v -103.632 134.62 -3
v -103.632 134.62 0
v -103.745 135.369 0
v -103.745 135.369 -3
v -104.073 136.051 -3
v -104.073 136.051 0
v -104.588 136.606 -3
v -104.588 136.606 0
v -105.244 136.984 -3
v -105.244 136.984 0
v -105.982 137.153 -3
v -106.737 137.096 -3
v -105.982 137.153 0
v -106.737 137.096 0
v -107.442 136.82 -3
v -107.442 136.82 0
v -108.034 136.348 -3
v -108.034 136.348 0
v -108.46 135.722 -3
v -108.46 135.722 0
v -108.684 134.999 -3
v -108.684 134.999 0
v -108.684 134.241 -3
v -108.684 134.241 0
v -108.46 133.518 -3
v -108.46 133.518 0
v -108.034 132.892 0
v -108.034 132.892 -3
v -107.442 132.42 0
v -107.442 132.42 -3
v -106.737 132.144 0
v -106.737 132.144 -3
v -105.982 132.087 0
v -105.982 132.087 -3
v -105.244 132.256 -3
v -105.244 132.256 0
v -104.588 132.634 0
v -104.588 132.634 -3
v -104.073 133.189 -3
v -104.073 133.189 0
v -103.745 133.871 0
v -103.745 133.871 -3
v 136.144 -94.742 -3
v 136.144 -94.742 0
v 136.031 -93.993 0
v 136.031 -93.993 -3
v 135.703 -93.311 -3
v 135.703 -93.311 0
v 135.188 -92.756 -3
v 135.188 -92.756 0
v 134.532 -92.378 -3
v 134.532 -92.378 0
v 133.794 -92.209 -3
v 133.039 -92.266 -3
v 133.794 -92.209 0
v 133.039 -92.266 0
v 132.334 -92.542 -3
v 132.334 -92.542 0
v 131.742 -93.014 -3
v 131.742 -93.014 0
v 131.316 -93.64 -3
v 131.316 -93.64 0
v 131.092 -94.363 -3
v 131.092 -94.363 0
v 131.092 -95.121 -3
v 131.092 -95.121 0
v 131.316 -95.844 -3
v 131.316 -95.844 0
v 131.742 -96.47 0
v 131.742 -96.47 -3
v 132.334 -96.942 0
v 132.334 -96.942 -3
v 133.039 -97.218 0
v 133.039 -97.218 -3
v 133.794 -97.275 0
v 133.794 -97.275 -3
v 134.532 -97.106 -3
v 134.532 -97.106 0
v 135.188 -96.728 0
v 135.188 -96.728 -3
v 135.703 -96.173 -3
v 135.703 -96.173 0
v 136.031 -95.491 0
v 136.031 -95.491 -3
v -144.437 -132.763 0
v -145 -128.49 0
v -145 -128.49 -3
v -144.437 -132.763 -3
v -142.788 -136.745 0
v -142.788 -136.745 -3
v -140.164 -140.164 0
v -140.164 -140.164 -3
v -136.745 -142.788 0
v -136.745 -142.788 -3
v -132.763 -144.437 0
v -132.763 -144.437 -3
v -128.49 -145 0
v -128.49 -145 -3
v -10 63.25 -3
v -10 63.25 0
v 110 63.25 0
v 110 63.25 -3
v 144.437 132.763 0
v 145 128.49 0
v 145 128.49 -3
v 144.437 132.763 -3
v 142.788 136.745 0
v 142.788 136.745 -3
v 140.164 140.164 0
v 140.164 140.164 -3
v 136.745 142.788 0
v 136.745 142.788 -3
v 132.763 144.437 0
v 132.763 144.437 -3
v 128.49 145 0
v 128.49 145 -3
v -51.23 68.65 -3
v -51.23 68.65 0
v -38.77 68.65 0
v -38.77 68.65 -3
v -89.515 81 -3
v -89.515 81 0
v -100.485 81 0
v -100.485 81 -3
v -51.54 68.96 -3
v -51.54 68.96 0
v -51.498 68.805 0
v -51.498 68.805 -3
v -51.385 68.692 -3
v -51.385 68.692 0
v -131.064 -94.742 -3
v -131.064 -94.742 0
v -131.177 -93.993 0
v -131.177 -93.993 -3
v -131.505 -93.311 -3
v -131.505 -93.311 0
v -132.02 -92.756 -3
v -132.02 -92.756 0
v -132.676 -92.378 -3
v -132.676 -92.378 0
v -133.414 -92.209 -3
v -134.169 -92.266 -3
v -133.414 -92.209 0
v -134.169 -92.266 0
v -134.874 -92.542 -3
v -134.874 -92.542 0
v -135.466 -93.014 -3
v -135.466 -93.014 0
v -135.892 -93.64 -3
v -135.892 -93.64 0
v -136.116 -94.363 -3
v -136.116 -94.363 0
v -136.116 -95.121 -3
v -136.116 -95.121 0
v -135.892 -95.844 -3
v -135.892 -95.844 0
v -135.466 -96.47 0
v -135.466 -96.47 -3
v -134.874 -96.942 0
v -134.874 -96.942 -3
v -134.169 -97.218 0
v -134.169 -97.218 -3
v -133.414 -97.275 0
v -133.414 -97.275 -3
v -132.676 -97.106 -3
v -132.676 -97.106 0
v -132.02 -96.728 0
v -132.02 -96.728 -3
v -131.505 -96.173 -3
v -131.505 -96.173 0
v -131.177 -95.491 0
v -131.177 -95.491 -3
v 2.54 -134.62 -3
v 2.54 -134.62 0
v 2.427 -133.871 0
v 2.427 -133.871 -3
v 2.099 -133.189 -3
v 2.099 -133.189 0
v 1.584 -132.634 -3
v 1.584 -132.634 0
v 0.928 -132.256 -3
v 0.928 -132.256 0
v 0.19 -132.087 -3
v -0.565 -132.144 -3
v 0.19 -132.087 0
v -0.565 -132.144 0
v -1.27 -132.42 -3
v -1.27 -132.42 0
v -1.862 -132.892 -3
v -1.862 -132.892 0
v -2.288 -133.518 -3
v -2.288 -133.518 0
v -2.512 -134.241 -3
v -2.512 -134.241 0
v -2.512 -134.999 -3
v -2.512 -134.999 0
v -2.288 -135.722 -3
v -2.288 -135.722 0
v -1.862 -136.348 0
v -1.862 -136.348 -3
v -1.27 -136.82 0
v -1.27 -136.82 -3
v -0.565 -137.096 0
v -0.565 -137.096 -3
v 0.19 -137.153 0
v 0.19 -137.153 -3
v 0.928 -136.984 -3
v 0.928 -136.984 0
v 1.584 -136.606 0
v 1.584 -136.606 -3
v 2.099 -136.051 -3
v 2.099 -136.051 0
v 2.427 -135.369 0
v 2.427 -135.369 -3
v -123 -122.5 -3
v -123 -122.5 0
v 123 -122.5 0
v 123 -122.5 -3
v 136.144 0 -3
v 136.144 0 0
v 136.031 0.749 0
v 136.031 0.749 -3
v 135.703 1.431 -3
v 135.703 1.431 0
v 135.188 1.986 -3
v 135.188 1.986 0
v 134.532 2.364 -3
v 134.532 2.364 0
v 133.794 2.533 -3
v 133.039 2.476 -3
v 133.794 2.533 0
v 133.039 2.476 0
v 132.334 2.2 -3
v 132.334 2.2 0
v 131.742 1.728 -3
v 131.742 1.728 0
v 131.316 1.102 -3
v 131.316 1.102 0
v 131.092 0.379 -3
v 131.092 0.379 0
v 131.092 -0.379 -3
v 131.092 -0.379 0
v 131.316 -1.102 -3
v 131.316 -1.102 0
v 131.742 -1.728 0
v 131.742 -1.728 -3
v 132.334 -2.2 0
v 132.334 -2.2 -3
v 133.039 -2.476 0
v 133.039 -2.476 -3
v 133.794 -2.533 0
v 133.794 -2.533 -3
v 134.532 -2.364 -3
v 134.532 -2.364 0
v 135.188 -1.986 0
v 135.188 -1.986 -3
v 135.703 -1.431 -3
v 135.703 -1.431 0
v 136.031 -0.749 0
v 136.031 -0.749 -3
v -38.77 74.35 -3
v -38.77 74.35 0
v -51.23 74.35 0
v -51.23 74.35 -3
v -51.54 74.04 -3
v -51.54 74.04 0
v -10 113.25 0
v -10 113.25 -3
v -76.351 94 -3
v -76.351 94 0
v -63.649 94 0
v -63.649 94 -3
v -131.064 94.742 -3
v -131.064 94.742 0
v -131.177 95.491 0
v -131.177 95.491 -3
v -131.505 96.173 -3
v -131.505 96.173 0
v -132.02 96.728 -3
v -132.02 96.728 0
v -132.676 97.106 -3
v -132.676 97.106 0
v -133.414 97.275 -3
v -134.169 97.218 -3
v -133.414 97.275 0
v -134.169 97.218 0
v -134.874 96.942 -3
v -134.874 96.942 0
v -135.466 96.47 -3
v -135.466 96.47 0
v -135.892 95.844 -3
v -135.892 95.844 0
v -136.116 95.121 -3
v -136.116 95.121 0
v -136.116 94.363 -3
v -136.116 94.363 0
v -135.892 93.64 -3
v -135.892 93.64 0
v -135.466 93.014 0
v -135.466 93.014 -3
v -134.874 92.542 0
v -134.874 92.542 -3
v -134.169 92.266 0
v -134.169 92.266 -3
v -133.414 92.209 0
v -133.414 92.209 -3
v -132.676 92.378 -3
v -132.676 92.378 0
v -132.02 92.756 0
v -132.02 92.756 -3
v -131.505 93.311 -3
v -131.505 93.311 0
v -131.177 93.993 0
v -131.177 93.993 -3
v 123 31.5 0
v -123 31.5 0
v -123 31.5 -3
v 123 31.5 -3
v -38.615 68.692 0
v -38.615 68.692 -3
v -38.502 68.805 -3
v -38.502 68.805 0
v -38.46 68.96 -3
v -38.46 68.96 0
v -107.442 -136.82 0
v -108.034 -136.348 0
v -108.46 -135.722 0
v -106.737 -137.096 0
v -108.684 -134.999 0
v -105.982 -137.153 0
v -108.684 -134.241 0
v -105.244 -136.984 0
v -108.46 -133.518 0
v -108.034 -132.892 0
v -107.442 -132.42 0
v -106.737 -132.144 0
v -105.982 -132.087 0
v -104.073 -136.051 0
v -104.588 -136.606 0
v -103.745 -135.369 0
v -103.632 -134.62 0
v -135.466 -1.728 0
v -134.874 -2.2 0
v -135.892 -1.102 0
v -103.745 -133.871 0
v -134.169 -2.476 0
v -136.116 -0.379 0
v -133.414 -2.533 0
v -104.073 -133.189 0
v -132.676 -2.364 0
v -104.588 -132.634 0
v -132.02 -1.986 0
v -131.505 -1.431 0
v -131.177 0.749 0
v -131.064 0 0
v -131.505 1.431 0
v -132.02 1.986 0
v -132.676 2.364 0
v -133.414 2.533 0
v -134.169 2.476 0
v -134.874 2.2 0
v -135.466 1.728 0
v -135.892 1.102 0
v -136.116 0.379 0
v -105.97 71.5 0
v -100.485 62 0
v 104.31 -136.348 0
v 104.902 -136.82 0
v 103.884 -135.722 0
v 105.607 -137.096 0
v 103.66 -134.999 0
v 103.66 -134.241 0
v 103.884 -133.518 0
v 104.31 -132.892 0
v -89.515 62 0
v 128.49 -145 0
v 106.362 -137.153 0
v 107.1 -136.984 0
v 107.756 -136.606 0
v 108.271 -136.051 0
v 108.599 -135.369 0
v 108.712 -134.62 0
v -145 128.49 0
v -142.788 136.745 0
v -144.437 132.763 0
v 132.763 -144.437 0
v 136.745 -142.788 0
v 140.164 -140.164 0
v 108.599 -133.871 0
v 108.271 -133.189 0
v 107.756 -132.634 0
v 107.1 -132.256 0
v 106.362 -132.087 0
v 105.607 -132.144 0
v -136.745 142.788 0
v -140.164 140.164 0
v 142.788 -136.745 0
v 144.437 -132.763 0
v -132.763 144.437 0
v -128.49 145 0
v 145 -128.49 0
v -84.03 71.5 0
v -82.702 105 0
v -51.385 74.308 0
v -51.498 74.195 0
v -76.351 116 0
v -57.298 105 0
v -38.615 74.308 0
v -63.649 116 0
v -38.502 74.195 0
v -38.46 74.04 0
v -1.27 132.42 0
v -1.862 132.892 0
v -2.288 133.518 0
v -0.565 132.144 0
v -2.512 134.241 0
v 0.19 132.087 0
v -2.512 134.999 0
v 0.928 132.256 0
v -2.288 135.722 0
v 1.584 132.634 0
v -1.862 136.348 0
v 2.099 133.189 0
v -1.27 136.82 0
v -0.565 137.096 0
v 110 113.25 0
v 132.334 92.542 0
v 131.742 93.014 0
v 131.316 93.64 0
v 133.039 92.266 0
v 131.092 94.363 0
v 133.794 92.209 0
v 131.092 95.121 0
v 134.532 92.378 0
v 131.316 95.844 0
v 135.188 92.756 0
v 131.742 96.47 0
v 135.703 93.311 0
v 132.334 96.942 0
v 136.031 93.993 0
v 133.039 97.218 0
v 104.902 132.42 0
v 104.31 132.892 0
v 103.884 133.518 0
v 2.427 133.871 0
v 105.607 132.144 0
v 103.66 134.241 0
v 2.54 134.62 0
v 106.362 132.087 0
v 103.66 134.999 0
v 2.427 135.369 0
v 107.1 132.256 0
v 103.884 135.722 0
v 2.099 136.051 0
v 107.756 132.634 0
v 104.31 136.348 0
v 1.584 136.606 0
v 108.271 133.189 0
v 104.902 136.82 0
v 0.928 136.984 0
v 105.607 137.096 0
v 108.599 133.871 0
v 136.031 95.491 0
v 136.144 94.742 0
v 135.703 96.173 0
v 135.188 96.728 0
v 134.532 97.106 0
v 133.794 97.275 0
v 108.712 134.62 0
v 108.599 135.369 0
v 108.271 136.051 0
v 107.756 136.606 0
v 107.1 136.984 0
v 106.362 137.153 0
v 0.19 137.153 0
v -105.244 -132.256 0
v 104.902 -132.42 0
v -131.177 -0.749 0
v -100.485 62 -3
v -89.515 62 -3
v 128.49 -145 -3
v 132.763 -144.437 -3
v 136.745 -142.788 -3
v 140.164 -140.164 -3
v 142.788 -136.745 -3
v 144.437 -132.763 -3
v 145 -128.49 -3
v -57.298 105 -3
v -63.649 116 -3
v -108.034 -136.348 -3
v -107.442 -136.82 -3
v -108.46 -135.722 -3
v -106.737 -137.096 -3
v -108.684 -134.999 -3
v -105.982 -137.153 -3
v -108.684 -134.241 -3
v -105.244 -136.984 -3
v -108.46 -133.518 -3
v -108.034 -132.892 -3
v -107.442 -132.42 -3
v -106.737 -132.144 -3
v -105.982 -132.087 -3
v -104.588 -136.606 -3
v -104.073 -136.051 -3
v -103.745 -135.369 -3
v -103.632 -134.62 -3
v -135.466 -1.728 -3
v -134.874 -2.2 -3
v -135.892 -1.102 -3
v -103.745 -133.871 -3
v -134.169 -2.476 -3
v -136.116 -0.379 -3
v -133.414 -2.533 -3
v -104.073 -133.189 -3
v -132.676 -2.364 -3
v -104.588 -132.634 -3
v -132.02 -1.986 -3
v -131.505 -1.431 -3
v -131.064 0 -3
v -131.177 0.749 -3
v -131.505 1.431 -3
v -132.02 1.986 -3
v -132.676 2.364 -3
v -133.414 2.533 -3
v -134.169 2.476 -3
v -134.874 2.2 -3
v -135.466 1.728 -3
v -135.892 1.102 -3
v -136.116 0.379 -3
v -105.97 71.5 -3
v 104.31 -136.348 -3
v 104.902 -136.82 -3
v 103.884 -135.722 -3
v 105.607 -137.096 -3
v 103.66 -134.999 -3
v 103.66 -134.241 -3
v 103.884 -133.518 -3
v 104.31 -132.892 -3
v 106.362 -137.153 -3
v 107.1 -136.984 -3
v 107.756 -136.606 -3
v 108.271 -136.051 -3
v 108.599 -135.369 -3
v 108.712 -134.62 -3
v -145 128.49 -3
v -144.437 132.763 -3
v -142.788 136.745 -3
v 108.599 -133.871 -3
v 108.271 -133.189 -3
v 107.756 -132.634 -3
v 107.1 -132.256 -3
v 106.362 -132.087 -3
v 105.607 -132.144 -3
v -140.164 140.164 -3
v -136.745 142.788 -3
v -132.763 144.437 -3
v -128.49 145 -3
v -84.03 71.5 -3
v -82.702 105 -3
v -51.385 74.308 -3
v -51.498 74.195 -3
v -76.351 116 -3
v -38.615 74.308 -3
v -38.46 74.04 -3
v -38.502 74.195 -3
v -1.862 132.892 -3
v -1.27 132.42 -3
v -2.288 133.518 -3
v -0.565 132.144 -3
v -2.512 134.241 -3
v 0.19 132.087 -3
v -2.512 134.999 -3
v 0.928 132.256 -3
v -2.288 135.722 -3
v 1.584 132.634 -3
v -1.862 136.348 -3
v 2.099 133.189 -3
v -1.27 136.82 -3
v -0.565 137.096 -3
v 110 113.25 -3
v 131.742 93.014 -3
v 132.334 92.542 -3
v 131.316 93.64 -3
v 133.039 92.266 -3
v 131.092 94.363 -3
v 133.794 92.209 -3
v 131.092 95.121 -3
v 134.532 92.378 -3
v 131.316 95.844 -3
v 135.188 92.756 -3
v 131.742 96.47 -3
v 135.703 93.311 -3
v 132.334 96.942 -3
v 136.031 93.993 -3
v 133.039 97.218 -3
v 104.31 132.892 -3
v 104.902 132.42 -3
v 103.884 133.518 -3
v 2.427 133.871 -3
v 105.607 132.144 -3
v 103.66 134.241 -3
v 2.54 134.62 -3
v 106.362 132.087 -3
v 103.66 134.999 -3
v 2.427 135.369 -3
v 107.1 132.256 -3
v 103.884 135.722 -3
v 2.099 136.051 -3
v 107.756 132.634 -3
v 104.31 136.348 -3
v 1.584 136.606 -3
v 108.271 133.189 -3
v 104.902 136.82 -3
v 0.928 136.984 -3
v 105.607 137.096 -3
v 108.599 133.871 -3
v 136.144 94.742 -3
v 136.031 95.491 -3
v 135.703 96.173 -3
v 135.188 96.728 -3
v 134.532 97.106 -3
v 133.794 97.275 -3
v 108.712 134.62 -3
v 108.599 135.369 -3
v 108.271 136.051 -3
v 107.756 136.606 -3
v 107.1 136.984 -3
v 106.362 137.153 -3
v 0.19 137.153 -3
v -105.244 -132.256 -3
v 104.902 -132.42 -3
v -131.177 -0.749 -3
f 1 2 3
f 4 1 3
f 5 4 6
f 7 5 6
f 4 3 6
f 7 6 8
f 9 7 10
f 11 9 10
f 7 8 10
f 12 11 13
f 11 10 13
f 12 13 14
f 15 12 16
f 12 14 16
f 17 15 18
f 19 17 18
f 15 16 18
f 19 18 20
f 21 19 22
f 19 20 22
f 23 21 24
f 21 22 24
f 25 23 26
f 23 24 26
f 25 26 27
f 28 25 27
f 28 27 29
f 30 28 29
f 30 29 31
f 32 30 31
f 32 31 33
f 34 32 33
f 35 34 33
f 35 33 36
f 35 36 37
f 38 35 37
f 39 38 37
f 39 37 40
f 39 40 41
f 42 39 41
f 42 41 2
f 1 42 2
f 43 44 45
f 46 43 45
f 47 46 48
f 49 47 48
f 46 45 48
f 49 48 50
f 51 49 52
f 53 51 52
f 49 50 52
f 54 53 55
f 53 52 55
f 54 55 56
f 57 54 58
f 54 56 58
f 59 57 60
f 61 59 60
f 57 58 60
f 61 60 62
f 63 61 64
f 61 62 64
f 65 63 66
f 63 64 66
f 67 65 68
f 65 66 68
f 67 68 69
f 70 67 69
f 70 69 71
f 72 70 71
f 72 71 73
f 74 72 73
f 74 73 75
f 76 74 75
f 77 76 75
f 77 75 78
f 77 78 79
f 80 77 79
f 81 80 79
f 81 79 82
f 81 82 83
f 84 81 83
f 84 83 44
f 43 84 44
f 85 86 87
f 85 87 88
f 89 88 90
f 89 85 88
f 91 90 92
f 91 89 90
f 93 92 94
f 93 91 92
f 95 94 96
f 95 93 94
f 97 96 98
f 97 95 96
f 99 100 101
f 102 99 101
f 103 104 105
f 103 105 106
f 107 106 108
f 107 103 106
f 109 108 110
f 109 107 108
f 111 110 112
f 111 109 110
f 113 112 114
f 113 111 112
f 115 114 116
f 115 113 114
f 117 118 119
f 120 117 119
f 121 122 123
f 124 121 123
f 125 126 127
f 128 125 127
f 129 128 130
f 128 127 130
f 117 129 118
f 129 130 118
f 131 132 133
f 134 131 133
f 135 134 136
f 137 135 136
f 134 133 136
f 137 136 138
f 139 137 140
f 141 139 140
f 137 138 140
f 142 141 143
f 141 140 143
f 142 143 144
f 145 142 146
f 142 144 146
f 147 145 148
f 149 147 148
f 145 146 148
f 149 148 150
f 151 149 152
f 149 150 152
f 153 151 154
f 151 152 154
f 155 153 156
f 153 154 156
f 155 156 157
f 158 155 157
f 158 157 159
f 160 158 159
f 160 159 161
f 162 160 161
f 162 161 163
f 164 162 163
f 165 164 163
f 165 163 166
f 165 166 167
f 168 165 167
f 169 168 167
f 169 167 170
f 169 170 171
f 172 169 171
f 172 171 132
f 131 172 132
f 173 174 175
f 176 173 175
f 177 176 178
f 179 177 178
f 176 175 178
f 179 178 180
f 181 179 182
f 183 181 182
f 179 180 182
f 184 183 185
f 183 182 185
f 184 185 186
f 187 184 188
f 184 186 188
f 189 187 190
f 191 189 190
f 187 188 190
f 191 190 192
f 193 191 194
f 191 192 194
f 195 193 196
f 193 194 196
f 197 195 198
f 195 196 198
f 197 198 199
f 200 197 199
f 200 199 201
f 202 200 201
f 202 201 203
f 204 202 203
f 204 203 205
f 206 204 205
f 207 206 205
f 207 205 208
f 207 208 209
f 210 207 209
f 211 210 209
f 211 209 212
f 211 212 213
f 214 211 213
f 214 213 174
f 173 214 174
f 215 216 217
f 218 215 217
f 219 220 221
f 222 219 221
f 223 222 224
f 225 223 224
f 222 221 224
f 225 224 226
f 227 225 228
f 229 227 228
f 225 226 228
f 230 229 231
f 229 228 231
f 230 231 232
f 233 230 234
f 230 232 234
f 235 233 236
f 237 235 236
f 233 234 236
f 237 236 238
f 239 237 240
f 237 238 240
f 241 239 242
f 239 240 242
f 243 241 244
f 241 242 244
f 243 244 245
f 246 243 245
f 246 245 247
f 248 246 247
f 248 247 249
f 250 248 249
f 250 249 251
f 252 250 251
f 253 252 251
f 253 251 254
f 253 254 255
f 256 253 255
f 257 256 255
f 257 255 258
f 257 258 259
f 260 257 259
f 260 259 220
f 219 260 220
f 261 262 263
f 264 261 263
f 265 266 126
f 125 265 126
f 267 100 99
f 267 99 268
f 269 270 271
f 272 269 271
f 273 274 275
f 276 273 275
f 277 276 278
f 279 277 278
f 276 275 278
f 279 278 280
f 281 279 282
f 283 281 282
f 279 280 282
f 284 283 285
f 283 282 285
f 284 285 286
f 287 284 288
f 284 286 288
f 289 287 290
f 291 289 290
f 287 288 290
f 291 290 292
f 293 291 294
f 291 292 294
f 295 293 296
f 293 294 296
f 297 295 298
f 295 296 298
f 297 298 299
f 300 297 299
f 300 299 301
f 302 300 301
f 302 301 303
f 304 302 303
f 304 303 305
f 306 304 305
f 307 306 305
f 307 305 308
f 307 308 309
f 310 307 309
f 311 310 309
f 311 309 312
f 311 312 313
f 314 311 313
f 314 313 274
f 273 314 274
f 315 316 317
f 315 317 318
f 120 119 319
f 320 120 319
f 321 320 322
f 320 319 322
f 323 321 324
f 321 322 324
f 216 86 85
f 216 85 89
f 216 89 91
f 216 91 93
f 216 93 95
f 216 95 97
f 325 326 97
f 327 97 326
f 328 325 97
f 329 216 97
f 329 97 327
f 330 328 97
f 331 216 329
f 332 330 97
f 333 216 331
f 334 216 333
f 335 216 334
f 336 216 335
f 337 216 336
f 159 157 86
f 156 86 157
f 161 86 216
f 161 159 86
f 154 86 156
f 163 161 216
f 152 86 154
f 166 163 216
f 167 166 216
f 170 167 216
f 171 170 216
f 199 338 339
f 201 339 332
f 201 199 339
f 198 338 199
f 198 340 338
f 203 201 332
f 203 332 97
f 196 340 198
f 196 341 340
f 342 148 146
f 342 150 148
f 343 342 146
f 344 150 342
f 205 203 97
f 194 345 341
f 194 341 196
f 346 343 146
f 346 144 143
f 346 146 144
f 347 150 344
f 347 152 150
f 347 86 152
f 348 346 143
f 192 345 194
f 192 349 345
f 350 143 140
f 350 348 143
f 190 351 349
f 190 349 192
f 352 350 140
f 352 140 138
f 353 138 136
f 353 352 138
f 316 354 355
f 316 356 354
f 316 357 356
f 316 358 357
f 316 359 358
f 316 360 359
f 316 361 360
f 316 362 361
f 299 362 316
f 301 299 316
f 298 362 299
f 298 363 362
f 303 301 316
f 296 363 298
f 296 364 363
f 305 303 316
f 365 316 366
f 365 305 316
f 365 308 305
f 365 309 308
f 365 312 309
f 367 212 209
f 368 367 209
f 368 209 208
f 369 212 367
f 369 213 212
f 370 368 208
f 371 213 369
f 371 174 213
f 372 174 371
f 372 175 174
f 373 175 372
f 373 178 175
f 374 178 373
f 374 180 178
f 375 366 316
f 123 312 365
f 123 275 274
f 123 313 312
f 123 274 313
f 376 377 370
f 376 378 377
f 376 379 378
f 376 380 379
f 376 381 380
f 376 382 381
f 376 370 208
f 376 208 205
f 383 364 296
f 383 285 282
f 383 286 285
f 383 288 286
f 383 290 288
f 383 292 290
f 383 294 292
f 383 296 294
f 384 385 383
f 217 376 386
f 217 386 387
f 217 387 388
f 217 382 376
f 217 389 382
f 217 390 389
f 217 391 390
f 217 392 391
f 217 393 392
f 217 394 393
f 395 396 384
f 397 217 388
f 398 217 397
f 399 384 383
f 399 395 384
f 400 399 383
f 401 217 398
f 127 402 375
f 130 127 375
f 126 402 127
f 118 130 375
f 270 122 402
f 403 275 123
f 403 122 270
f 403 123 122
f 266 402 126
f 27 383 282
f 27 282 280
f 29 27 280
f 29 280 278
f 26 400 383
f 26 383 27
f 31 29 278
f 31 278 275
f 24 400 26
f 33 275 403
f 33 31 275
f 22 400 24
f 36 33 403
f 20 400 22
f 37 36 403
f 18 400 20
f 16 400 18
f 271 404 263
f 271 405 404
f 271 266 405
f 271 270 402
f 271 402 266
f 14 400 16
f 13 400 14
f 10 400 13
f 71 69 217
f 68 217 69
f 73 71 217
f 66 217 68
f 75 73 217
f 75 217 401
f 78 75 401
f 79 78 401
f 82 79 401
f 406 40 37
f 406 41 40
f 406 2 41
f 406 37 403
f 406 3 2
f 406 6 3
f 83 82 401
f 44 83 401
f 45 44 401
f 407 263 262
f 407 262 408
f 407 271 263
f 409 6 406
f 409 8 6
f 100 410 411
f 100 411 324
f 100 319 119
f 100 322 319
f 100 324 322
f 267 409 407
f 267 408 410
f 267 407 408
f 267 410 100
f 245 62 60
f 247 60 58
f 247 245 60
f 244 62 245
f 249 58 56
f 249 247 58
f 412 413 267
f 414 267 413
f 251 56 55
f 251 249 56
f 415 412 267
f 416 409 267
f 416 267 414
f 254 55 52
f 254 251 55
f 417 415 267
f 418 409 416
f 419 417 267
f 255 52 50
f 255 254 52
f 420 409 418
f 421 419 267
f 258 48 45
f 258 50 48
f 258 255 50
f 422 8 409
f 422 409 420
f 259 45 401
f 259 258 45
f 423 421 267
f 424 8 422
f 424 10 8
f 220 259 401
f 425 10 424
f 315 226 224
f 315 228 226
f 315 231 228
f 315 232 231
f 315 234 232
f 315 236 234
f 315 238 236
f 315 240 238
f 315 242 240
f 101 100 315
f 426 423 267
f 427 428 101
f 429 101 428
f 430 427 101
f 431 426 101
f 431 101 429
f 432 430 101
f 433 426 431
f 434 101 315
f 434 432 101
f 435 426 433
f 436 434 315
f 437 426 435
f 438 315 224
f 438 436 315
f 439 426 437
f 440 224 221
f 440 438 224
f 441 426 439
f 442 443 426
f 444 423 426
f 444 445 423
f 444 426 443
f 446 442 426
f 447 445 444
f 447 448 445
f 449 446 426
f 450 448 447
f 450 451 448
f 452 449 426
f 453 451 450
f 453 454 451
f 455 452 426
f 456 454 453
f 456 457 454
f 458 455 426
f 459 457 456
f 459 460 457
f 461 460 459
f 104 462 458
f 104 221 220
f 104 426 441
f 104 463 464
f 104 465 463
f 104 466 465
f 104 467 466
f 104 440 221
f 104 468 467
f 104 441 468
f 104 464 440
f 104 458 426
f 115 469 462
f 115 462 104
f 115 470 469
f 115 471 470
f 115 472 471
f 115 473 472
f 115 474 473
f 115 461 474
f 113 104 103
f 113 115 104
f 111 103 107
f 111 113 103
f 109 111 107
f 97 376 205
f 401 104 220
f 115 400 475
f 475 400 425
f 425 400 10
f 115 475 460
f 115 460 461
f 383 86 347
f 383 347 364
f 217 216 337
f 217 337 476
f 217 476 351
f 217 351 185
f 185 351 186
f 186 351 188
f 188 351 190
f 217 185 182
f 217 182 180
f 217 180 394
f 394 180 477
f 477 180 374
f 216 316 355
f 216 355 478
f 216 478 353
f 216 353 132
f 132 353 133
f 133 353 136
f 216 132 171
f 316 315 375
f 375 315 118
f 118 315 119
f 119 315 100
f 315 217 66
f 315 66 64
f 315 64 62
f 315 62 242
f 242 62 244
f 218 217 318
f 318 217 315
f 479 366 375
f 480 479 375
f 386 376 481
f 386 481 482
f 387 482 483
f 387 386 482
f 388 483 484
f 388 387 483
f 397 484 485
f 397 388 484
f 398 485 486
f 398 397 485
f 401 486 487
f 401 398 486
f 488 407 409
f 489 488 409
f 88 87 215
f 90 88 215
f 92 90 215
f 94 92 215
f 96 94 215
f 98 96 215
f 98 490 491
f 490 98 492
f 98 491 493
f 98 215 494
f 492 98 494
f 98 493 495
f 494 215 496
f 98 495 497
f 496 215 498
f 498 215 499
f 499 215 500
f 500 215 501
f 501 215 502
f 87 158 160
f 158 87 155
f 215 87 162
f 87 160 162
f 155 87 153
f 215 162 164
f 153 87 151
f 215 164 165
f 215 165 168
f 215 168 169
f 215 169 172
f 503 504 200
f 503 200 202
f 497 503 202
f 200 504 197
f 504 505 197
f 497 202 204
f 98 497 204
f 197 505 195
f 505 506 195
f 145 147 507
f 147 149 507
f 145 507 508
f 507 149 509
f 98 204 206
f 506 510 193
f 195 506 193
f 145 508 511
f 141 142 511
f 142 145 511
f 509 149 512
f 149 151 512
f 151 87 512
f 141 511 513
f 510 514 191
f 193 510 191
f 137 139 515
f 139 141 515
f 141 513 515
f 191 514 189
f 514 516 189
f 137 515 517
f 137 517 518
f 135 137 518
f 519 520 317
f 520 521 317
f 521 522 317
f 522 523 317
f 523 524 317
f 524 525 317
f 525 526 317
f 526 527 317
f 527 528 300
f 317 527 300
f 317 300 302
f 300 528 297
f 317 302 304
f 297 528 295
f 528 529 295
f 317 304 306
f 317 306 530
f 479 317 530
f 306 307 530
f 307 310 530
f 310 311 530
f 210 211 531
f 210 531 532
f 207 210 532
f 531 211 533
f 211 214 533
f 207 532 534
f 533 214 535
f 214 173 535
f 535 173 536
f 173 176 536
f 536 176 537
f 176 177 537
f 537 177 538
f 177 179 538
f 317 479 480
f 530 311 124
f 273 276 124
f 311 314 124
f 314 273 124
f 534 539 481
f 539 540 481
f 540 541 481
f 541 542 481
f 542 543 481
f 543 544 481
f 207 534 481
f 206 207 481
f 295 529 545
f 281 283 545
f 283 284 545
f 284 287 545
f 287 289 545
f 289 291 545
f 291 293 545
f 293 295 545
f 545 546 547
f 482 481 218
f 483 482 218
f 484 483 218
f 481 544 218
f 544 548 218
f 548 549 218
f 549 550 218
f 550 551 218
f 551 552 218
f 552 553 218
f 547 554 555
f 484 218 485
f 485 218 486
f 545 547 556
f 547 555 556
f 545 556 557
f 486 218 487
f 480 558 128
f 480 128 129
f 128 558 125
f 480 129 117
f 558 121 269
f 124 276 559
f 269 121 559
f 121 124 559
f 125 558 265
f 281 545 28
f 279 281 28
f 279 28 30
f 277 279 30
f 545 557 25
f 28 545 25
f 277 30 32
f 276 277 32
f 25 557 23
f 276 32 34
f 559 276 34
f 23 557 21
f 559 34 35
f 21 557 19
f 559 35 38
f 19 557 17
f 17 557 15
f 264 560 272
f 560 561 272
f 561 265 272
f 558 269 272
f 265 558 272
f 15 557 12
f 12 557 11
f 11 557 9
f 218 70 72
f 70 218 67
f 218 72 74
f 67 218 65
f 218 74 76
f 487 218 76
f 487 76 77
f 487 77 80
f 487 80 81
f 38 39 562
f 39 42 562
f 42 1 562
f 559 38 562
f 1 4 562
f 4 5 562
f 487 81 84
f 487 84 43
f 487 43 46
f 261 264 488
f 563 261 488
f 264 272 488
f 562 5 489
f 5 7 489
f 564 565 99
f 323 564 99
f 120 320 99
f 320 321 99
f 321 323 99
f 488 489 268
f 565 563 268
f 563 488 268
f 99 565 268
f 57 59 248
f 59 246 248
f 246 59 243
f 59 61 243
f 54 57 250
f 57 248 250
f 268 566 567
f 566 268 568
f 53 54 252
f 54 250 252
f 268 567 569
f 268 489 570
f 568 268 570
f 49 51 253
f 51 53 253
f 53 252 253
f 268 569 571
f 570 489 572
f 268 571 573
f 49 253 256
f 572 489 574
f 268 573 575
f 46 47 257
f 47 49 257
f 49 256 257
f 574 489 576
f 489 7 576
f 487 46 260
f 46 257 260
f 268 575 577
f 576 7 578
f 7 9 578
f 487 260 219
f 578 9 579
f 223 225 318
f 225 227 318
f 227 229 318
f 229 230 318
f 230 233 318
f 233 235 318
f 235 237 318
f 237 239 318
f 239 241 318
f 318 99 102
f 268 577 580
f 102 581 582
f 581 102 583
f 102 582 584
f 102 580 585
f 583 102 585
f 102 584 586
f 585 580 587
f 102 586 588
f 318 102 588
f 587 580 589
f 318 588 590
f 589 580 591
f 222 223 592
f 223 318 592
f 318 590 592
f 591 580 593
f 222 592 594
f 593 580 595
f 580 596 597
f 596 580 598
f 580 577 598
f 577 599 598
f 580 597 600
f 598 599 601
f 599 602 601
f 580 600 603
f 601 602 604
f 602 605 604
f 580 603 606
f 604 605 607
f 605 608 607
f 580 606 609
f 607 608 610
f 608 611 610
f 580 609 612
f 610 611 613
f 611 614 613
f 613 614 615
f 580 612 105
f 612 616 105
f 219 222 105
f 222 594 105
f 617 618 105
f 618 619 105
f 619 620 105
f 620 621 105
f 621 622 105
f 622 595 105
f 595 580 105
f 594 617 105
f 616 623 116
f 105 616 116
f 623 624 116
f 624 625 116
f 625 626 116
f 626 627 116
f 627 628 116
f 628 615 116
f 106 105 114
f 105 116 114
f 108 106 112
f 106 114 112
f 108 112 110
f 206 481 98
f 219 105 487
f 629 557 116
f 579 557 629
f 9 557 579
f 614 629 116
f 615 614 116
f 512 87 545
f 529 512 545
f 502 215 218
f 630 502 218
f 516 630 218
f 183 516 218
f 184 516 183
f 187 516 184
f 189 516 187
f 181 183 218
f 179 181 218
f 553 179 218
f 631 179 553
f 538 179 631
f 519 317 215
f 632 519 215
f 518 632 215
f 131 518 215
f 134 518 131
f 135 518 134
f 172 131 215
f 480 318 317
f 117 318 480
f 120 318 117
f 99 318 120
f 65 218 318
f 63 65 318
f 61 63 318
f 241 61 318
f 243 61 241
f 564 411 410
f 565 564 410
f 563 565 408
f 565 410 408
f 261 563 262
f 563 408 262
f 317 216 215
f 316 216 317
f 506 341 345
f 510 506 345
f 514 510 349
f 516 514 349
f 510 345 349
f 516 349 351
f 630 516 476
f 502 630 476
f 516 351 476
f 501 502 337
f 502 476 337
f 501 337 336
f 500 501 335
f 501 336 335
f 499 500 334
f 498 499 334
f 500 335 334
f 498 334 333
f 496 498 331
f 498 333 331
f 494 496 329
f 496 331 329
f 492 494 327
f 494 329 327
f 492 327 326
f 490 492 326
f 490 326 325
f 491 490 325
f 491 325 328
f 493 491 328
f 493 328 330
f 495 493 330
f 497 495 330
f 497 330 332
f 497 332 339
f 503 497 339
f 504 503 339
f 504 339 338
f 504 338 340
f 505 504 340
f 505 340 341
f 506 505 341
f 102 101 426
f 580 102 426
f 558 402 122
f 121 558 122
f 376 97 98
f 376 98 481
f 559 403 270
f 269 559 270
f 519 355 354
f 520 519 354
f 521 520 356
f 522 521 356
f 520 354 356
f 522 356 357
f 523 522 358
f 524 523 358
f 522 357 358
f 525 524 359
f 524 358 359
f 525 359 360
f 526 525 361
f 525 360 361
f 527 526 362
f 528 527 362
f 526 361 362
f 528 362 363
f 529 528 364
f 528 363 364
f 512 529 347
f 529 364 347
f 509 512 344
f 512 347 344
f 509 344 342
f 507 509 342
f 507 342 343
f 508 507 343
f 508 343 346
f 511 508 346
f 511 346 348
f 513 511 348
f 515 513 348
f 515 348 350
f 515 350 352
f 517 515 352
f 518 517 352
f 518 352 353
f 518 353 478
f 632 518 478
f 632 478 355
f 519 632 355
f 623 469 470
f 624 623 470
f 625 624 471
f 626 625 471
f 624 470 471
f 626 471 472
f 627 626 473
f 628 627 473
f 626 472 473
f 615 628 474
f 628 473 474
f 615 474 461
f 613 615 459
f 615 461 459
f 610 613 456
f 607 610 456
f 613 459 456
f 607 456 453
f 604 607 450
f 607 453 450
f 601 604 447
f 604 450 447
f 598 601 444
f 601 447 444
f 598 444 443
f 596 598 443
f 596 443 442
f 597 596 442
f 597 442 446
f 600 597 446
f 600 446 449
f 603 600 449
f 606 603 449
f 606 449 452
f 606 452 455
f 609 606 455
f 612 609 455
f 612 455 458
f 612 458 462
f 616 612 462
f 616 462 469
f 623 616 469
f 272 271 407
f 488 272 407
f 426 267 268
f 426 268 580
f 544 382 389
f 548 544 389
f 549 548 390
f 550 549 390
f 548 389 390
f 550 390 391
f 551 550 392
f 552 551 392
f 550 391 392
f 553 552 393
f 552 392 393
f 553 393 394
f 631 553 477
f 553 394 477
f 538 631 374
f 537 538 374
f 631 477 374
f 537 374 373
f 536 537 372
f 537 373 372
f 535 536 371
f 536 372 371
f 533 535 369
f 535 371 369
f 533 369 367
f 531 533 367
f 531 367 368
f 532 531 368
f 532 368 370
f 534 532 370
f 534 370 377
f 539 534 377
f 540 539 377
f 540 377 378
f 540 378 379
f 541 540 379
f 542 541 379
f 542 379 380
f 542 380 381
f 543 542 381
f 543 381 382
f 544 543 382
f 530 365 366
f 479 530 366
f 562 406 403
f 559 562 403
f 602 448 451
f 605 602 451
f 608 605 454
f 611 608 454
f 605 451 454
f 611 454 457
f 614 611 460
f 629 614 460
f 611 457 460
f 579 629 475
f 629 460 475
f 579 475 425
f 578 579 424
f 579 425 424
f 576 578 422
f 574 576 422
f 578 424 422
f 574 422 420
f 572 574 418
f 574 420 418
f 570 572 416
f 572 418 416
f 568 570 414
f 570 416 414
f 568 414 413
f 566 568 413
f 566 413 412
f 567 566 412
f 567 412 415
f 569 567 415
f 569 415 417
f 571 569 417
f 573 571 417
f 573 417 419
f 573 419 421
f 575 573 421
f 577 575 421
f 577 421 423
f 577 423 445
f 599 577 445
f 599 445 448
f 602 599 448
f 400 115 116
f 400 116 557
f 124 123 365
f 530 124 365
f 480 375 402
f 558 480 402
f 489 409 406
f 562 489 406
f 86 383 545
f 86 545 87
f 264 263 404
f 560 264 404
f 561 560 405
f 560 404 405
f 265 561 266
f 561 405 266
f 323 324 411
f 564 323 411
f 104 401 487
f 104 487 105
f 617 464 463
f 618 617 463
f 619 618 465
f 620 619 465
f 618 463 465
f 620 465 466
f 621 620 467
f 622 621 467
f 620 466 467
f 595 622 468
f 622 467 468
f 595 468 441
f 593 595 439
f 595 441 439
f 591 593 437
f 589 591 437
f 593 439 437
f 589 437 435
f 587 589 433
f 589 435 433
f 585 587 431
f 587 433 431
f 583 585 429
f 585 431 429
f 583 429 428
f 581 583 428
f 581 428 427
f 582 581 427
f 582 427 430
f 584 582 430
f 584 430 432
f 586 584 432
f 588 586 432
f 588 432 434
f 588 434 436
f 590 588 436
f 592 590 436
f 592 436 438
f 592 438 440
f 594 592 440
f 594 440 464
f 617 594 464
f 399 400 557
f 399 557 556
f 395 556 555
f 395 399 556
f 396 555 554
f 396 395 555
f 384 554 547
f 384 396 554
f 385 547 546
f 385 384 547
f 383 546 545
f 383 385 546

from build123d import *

# Parameters (mm, degrees)
SKETCH3_W           = 246
SKETCH3_H           = 154
SKETCH3_W_2         = 120
SKETCH3_H_2         = 50
BOSS_EXTRUDE1_DEPTH = 3
SKETCH4_R           = 2.54
CUT_EXTRUDE1_DEPTH  = 47.752


with BuildPart() as part:
    # Sketch3 → Boss-Extrude1 (new body)
    with BuildSketch(Plane.XY):
        with BuildLine():
            Line((-128.49, -145), (128.49, -145))
            ThreePointArc((128.49, -145), (140.164332957, -140.164332957), (145, -128.49))
            Line((145, -128.49), (145, 128.49))
            ThreePointArc((145, 128.49), (140.164332957, 140.164332957), (128.49, 145))
            Line((128.49, 145), (-128.49, 145))
            ThreePointArc((-128.49, 145), (-140.164332957, 140.164332957), (-145, 128.49))
            Line((-145, 128.49), (-145, -128.49))
            ThreePointArc((-145, -128.49), (-140.164332957, -140.164332957), (-128.49, -145))
        make_face()
        with Locations((0, -45.5)):
            Rectangle(SKETCH3_W, SKETCH3_H, mode=Mode.SUBTRACT)
        with BuildLine():
            Line((-38.77, 74.35), (-51.23, 74.35))
            ThreePointArc((-51.23, 74.35), (-51.449203102, 74.259203102), (-51.54, 74.04))
            Line((-51.54, 74.04), (-51.54, 68.96))
            ThreePointArc((-51.54, 68.96), (-51.449203102, 68.740796898), (-51.23, 68.65))
            Line((-51.23, 68.65), (-38.77, 68.65))
            ThreePointArc((-38.77, 68.65), (-38.550796898, 68.740796898), (-38.46, 68.96))
            Line((-38.46, 68.96), (-38.46, 74.04))
            ThreePointArc((-38.46, 74.04), (-38.550796898, 74.259203102), (-38.77, 74.35))
        make_face(mode=Mode.SUBTRACT)
        with Locations((50, 88.25)):
            Rectangle(SKETCH3_W_2, SKETCH3_H_2, mode=Mode.SUBTRACT)
        Polygon((-57.298294078, 105), (-63.649147039, 116), (-76.350852961, 116), (-82.701705922, 105), (-76.350852961, 94), (-63.649147039, 94), align=None, mode=Mode.SUBTRACT)
        Polygon((-84.030344885, 71.5), (-89.515172443, 81), (-100.484827557, 81), (-105.969655115, 71.5), (-100.484827557, 62), (-89.515172443, 62), align=None, mode=Mode.SUBTRACT)
    extrude(amount=-BOSS_EXTRUDE1_DEPTH)

    # Sketch4 → Cut-Extrude1 (cut)
    with BuildSketch(Plane.XY):
        with Locations((-133.604, 94.742)):
            Circle(SKETCH4_R)
        with Locations((-106.172, 134.62)):
            Circle(SKETCH4_R)
        with Locations((-133.604, -94.742)):
            Circle(SKETCH4_R)
        with Locations((-133.604, 0)):
            Circle(SKETCH4_R)
        with Locations((0, 134.62)):
            Circle(SKETCH4_R)
        with Locations((0, -134.62)):
            Circle(SKETCH4_R)
        with Locations((-106.172, -134.62)):
            Circle(SKETCH4_R)
        with Locations((106.172, -134.62)):
            Circle(SKETCH4_R)
        with Locations((133.604, 0)):
            Circle(SKETCH4_R)
        with Locations((133.604, -94.742)):
            Circle(SKETCH4_R)
        with Locations((106.172, 134.62)):
            Circle(SKETCH4_R)
        with Locations((133.604, 94.742)):
            Circle(SKETCH4_R)
    extrude(amount=-CUT_EXTRUDE1_DEPTH, mode=Mode.SUBTRACT)


solid = part.part
